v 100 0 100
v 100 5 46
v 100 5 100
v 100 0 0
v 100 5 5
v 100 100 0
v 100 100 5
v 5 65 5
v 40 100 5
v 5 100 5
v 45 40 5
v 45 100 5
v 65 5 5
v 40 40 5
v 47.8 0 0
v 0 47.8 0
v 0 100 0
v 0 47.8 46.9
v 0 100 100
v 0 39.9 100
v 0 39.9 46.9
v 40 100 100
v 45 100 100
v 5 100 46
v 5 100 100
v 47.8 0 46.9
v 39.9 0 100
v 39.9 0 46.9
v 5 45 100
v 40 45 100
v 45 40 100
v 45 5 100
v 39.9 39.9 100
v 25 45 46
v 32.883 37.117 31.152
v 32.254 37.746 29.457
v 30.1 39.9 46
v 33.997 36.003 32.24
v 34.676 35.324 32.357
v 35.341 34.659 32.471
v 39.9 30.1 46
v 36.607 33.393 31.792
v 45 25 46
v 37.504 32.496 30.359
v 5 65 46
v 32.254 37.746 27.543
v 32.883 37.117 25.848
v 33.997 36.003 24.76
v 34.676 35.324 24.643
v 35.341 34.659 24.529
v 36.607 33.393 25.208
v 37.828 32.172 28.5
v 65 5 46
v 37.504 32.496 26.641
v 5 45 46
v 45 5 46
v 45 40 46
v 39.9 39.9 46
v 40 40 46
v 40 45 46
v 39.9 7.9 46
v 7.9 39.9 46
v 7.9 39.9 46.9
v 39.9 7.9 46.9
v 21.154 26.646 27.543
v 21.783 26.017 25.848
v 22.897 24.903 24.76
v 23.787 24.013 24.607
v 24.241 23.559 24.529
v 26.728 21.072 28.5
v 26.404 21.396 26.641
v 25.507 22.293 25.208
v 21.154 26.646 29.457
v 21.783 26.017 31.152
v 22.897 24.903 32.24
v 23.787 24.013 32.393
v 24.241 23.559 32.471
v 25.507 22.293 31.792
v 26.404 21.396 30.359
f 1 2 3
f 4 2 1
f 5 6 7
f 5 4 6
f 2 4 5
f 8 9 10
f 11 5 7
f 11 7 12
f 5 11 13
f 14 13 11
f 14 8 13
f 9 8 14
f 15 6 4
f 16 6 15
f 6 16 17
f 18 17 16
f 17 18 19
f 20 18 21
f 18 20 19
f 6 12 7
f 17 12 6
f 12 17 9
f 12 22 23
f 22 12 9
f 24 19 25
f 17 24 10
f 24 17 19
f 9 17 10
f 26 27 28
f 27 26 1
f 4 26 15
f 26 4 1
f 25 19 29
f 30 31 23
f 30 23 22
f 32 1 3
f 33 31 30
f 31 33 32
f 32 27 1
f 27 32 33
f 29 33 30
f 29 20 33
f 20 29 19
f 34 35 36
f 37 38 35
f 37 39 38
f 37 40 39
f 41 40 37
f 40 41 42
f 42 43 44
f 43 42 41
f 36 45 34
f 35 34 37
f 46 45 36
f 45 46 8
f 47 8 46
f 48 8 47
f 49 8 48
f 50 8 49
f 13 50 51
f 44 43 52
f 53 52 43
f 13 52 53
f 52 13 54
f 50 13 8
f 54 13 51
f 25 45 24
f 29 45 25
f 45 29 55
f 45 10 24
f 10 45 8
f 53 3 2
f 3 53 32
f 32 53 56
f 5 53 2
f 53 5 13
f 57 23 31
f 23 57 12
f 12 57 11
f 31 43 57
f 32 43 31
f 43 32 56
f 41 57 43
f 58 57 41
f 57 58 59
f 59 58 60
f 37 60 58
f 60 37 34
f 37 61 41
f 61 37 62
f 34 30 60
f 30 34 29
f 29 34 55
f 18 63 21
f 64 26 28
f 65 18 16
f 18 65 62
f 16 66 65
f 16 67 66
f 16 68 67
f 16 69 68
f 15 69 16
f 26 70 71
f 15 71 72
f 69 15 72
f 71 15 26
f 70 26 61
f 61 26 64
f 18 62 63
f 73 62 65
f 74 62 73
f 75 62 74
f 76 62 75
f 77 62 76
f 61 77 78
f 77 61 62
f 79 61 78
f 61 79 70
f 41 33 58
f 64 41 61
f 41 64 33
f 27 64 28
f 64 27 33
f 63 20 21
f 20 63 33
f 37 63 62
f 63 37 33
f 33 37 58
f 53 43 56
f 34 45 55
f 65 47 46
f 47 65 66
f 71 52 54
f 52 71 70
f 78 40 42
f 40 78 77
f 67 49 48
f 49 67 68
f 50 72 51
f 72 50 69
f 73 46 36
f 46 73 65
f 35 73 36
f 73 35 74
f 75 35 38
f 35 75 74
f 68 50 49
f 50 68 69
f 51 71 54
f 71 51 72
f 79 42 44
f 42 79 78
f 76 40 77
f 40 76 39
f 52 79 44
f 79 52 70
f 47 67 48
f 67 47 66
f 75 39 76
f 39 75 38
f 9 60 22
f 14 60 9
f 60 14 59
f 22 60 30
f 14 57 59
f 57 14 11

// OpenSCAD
module base() {
	// Base plate
	cube([100,100,5]);

	// Big triangle
	linear_extrude(height = 100)
	polygon(points=[[0,0],[70,0],[0,70]], paths=[[0,1,2]]);

	// Side mount
	cube([5, 100, 100]);
	cube([100, 5, 100]);

	// Leg but bigger
	translate([0, 0, 46])
	cube([45, 45, 100-46]);
}


difference() {
	base(); 

	// Triangle
	translate([-0.1, -0.1, -0.1])
	linear_extrude(height = 47)
	polygon(points=[[0,0],[48,0],[0,48]], paths=[[0,1,2]]);

	// Uitsparing voor poot
	translate([-0.1, -0.1, 46])
	cube([40,40,100]);

	// Dunner maken uitsparing poot
	translate([45, 5, 46])
	cube([100,100,100]);

	translate([5, 45, 46])
	cube([100,100,100]);

	// Gat voor grote moer
	translate([0, 0, 28.5])
	rotate([-90, 0, -45])
	cylinder(r=4, h=100);
}

// Extra support
translate([40, 40, 0])
cube([5, 60, 100]);
